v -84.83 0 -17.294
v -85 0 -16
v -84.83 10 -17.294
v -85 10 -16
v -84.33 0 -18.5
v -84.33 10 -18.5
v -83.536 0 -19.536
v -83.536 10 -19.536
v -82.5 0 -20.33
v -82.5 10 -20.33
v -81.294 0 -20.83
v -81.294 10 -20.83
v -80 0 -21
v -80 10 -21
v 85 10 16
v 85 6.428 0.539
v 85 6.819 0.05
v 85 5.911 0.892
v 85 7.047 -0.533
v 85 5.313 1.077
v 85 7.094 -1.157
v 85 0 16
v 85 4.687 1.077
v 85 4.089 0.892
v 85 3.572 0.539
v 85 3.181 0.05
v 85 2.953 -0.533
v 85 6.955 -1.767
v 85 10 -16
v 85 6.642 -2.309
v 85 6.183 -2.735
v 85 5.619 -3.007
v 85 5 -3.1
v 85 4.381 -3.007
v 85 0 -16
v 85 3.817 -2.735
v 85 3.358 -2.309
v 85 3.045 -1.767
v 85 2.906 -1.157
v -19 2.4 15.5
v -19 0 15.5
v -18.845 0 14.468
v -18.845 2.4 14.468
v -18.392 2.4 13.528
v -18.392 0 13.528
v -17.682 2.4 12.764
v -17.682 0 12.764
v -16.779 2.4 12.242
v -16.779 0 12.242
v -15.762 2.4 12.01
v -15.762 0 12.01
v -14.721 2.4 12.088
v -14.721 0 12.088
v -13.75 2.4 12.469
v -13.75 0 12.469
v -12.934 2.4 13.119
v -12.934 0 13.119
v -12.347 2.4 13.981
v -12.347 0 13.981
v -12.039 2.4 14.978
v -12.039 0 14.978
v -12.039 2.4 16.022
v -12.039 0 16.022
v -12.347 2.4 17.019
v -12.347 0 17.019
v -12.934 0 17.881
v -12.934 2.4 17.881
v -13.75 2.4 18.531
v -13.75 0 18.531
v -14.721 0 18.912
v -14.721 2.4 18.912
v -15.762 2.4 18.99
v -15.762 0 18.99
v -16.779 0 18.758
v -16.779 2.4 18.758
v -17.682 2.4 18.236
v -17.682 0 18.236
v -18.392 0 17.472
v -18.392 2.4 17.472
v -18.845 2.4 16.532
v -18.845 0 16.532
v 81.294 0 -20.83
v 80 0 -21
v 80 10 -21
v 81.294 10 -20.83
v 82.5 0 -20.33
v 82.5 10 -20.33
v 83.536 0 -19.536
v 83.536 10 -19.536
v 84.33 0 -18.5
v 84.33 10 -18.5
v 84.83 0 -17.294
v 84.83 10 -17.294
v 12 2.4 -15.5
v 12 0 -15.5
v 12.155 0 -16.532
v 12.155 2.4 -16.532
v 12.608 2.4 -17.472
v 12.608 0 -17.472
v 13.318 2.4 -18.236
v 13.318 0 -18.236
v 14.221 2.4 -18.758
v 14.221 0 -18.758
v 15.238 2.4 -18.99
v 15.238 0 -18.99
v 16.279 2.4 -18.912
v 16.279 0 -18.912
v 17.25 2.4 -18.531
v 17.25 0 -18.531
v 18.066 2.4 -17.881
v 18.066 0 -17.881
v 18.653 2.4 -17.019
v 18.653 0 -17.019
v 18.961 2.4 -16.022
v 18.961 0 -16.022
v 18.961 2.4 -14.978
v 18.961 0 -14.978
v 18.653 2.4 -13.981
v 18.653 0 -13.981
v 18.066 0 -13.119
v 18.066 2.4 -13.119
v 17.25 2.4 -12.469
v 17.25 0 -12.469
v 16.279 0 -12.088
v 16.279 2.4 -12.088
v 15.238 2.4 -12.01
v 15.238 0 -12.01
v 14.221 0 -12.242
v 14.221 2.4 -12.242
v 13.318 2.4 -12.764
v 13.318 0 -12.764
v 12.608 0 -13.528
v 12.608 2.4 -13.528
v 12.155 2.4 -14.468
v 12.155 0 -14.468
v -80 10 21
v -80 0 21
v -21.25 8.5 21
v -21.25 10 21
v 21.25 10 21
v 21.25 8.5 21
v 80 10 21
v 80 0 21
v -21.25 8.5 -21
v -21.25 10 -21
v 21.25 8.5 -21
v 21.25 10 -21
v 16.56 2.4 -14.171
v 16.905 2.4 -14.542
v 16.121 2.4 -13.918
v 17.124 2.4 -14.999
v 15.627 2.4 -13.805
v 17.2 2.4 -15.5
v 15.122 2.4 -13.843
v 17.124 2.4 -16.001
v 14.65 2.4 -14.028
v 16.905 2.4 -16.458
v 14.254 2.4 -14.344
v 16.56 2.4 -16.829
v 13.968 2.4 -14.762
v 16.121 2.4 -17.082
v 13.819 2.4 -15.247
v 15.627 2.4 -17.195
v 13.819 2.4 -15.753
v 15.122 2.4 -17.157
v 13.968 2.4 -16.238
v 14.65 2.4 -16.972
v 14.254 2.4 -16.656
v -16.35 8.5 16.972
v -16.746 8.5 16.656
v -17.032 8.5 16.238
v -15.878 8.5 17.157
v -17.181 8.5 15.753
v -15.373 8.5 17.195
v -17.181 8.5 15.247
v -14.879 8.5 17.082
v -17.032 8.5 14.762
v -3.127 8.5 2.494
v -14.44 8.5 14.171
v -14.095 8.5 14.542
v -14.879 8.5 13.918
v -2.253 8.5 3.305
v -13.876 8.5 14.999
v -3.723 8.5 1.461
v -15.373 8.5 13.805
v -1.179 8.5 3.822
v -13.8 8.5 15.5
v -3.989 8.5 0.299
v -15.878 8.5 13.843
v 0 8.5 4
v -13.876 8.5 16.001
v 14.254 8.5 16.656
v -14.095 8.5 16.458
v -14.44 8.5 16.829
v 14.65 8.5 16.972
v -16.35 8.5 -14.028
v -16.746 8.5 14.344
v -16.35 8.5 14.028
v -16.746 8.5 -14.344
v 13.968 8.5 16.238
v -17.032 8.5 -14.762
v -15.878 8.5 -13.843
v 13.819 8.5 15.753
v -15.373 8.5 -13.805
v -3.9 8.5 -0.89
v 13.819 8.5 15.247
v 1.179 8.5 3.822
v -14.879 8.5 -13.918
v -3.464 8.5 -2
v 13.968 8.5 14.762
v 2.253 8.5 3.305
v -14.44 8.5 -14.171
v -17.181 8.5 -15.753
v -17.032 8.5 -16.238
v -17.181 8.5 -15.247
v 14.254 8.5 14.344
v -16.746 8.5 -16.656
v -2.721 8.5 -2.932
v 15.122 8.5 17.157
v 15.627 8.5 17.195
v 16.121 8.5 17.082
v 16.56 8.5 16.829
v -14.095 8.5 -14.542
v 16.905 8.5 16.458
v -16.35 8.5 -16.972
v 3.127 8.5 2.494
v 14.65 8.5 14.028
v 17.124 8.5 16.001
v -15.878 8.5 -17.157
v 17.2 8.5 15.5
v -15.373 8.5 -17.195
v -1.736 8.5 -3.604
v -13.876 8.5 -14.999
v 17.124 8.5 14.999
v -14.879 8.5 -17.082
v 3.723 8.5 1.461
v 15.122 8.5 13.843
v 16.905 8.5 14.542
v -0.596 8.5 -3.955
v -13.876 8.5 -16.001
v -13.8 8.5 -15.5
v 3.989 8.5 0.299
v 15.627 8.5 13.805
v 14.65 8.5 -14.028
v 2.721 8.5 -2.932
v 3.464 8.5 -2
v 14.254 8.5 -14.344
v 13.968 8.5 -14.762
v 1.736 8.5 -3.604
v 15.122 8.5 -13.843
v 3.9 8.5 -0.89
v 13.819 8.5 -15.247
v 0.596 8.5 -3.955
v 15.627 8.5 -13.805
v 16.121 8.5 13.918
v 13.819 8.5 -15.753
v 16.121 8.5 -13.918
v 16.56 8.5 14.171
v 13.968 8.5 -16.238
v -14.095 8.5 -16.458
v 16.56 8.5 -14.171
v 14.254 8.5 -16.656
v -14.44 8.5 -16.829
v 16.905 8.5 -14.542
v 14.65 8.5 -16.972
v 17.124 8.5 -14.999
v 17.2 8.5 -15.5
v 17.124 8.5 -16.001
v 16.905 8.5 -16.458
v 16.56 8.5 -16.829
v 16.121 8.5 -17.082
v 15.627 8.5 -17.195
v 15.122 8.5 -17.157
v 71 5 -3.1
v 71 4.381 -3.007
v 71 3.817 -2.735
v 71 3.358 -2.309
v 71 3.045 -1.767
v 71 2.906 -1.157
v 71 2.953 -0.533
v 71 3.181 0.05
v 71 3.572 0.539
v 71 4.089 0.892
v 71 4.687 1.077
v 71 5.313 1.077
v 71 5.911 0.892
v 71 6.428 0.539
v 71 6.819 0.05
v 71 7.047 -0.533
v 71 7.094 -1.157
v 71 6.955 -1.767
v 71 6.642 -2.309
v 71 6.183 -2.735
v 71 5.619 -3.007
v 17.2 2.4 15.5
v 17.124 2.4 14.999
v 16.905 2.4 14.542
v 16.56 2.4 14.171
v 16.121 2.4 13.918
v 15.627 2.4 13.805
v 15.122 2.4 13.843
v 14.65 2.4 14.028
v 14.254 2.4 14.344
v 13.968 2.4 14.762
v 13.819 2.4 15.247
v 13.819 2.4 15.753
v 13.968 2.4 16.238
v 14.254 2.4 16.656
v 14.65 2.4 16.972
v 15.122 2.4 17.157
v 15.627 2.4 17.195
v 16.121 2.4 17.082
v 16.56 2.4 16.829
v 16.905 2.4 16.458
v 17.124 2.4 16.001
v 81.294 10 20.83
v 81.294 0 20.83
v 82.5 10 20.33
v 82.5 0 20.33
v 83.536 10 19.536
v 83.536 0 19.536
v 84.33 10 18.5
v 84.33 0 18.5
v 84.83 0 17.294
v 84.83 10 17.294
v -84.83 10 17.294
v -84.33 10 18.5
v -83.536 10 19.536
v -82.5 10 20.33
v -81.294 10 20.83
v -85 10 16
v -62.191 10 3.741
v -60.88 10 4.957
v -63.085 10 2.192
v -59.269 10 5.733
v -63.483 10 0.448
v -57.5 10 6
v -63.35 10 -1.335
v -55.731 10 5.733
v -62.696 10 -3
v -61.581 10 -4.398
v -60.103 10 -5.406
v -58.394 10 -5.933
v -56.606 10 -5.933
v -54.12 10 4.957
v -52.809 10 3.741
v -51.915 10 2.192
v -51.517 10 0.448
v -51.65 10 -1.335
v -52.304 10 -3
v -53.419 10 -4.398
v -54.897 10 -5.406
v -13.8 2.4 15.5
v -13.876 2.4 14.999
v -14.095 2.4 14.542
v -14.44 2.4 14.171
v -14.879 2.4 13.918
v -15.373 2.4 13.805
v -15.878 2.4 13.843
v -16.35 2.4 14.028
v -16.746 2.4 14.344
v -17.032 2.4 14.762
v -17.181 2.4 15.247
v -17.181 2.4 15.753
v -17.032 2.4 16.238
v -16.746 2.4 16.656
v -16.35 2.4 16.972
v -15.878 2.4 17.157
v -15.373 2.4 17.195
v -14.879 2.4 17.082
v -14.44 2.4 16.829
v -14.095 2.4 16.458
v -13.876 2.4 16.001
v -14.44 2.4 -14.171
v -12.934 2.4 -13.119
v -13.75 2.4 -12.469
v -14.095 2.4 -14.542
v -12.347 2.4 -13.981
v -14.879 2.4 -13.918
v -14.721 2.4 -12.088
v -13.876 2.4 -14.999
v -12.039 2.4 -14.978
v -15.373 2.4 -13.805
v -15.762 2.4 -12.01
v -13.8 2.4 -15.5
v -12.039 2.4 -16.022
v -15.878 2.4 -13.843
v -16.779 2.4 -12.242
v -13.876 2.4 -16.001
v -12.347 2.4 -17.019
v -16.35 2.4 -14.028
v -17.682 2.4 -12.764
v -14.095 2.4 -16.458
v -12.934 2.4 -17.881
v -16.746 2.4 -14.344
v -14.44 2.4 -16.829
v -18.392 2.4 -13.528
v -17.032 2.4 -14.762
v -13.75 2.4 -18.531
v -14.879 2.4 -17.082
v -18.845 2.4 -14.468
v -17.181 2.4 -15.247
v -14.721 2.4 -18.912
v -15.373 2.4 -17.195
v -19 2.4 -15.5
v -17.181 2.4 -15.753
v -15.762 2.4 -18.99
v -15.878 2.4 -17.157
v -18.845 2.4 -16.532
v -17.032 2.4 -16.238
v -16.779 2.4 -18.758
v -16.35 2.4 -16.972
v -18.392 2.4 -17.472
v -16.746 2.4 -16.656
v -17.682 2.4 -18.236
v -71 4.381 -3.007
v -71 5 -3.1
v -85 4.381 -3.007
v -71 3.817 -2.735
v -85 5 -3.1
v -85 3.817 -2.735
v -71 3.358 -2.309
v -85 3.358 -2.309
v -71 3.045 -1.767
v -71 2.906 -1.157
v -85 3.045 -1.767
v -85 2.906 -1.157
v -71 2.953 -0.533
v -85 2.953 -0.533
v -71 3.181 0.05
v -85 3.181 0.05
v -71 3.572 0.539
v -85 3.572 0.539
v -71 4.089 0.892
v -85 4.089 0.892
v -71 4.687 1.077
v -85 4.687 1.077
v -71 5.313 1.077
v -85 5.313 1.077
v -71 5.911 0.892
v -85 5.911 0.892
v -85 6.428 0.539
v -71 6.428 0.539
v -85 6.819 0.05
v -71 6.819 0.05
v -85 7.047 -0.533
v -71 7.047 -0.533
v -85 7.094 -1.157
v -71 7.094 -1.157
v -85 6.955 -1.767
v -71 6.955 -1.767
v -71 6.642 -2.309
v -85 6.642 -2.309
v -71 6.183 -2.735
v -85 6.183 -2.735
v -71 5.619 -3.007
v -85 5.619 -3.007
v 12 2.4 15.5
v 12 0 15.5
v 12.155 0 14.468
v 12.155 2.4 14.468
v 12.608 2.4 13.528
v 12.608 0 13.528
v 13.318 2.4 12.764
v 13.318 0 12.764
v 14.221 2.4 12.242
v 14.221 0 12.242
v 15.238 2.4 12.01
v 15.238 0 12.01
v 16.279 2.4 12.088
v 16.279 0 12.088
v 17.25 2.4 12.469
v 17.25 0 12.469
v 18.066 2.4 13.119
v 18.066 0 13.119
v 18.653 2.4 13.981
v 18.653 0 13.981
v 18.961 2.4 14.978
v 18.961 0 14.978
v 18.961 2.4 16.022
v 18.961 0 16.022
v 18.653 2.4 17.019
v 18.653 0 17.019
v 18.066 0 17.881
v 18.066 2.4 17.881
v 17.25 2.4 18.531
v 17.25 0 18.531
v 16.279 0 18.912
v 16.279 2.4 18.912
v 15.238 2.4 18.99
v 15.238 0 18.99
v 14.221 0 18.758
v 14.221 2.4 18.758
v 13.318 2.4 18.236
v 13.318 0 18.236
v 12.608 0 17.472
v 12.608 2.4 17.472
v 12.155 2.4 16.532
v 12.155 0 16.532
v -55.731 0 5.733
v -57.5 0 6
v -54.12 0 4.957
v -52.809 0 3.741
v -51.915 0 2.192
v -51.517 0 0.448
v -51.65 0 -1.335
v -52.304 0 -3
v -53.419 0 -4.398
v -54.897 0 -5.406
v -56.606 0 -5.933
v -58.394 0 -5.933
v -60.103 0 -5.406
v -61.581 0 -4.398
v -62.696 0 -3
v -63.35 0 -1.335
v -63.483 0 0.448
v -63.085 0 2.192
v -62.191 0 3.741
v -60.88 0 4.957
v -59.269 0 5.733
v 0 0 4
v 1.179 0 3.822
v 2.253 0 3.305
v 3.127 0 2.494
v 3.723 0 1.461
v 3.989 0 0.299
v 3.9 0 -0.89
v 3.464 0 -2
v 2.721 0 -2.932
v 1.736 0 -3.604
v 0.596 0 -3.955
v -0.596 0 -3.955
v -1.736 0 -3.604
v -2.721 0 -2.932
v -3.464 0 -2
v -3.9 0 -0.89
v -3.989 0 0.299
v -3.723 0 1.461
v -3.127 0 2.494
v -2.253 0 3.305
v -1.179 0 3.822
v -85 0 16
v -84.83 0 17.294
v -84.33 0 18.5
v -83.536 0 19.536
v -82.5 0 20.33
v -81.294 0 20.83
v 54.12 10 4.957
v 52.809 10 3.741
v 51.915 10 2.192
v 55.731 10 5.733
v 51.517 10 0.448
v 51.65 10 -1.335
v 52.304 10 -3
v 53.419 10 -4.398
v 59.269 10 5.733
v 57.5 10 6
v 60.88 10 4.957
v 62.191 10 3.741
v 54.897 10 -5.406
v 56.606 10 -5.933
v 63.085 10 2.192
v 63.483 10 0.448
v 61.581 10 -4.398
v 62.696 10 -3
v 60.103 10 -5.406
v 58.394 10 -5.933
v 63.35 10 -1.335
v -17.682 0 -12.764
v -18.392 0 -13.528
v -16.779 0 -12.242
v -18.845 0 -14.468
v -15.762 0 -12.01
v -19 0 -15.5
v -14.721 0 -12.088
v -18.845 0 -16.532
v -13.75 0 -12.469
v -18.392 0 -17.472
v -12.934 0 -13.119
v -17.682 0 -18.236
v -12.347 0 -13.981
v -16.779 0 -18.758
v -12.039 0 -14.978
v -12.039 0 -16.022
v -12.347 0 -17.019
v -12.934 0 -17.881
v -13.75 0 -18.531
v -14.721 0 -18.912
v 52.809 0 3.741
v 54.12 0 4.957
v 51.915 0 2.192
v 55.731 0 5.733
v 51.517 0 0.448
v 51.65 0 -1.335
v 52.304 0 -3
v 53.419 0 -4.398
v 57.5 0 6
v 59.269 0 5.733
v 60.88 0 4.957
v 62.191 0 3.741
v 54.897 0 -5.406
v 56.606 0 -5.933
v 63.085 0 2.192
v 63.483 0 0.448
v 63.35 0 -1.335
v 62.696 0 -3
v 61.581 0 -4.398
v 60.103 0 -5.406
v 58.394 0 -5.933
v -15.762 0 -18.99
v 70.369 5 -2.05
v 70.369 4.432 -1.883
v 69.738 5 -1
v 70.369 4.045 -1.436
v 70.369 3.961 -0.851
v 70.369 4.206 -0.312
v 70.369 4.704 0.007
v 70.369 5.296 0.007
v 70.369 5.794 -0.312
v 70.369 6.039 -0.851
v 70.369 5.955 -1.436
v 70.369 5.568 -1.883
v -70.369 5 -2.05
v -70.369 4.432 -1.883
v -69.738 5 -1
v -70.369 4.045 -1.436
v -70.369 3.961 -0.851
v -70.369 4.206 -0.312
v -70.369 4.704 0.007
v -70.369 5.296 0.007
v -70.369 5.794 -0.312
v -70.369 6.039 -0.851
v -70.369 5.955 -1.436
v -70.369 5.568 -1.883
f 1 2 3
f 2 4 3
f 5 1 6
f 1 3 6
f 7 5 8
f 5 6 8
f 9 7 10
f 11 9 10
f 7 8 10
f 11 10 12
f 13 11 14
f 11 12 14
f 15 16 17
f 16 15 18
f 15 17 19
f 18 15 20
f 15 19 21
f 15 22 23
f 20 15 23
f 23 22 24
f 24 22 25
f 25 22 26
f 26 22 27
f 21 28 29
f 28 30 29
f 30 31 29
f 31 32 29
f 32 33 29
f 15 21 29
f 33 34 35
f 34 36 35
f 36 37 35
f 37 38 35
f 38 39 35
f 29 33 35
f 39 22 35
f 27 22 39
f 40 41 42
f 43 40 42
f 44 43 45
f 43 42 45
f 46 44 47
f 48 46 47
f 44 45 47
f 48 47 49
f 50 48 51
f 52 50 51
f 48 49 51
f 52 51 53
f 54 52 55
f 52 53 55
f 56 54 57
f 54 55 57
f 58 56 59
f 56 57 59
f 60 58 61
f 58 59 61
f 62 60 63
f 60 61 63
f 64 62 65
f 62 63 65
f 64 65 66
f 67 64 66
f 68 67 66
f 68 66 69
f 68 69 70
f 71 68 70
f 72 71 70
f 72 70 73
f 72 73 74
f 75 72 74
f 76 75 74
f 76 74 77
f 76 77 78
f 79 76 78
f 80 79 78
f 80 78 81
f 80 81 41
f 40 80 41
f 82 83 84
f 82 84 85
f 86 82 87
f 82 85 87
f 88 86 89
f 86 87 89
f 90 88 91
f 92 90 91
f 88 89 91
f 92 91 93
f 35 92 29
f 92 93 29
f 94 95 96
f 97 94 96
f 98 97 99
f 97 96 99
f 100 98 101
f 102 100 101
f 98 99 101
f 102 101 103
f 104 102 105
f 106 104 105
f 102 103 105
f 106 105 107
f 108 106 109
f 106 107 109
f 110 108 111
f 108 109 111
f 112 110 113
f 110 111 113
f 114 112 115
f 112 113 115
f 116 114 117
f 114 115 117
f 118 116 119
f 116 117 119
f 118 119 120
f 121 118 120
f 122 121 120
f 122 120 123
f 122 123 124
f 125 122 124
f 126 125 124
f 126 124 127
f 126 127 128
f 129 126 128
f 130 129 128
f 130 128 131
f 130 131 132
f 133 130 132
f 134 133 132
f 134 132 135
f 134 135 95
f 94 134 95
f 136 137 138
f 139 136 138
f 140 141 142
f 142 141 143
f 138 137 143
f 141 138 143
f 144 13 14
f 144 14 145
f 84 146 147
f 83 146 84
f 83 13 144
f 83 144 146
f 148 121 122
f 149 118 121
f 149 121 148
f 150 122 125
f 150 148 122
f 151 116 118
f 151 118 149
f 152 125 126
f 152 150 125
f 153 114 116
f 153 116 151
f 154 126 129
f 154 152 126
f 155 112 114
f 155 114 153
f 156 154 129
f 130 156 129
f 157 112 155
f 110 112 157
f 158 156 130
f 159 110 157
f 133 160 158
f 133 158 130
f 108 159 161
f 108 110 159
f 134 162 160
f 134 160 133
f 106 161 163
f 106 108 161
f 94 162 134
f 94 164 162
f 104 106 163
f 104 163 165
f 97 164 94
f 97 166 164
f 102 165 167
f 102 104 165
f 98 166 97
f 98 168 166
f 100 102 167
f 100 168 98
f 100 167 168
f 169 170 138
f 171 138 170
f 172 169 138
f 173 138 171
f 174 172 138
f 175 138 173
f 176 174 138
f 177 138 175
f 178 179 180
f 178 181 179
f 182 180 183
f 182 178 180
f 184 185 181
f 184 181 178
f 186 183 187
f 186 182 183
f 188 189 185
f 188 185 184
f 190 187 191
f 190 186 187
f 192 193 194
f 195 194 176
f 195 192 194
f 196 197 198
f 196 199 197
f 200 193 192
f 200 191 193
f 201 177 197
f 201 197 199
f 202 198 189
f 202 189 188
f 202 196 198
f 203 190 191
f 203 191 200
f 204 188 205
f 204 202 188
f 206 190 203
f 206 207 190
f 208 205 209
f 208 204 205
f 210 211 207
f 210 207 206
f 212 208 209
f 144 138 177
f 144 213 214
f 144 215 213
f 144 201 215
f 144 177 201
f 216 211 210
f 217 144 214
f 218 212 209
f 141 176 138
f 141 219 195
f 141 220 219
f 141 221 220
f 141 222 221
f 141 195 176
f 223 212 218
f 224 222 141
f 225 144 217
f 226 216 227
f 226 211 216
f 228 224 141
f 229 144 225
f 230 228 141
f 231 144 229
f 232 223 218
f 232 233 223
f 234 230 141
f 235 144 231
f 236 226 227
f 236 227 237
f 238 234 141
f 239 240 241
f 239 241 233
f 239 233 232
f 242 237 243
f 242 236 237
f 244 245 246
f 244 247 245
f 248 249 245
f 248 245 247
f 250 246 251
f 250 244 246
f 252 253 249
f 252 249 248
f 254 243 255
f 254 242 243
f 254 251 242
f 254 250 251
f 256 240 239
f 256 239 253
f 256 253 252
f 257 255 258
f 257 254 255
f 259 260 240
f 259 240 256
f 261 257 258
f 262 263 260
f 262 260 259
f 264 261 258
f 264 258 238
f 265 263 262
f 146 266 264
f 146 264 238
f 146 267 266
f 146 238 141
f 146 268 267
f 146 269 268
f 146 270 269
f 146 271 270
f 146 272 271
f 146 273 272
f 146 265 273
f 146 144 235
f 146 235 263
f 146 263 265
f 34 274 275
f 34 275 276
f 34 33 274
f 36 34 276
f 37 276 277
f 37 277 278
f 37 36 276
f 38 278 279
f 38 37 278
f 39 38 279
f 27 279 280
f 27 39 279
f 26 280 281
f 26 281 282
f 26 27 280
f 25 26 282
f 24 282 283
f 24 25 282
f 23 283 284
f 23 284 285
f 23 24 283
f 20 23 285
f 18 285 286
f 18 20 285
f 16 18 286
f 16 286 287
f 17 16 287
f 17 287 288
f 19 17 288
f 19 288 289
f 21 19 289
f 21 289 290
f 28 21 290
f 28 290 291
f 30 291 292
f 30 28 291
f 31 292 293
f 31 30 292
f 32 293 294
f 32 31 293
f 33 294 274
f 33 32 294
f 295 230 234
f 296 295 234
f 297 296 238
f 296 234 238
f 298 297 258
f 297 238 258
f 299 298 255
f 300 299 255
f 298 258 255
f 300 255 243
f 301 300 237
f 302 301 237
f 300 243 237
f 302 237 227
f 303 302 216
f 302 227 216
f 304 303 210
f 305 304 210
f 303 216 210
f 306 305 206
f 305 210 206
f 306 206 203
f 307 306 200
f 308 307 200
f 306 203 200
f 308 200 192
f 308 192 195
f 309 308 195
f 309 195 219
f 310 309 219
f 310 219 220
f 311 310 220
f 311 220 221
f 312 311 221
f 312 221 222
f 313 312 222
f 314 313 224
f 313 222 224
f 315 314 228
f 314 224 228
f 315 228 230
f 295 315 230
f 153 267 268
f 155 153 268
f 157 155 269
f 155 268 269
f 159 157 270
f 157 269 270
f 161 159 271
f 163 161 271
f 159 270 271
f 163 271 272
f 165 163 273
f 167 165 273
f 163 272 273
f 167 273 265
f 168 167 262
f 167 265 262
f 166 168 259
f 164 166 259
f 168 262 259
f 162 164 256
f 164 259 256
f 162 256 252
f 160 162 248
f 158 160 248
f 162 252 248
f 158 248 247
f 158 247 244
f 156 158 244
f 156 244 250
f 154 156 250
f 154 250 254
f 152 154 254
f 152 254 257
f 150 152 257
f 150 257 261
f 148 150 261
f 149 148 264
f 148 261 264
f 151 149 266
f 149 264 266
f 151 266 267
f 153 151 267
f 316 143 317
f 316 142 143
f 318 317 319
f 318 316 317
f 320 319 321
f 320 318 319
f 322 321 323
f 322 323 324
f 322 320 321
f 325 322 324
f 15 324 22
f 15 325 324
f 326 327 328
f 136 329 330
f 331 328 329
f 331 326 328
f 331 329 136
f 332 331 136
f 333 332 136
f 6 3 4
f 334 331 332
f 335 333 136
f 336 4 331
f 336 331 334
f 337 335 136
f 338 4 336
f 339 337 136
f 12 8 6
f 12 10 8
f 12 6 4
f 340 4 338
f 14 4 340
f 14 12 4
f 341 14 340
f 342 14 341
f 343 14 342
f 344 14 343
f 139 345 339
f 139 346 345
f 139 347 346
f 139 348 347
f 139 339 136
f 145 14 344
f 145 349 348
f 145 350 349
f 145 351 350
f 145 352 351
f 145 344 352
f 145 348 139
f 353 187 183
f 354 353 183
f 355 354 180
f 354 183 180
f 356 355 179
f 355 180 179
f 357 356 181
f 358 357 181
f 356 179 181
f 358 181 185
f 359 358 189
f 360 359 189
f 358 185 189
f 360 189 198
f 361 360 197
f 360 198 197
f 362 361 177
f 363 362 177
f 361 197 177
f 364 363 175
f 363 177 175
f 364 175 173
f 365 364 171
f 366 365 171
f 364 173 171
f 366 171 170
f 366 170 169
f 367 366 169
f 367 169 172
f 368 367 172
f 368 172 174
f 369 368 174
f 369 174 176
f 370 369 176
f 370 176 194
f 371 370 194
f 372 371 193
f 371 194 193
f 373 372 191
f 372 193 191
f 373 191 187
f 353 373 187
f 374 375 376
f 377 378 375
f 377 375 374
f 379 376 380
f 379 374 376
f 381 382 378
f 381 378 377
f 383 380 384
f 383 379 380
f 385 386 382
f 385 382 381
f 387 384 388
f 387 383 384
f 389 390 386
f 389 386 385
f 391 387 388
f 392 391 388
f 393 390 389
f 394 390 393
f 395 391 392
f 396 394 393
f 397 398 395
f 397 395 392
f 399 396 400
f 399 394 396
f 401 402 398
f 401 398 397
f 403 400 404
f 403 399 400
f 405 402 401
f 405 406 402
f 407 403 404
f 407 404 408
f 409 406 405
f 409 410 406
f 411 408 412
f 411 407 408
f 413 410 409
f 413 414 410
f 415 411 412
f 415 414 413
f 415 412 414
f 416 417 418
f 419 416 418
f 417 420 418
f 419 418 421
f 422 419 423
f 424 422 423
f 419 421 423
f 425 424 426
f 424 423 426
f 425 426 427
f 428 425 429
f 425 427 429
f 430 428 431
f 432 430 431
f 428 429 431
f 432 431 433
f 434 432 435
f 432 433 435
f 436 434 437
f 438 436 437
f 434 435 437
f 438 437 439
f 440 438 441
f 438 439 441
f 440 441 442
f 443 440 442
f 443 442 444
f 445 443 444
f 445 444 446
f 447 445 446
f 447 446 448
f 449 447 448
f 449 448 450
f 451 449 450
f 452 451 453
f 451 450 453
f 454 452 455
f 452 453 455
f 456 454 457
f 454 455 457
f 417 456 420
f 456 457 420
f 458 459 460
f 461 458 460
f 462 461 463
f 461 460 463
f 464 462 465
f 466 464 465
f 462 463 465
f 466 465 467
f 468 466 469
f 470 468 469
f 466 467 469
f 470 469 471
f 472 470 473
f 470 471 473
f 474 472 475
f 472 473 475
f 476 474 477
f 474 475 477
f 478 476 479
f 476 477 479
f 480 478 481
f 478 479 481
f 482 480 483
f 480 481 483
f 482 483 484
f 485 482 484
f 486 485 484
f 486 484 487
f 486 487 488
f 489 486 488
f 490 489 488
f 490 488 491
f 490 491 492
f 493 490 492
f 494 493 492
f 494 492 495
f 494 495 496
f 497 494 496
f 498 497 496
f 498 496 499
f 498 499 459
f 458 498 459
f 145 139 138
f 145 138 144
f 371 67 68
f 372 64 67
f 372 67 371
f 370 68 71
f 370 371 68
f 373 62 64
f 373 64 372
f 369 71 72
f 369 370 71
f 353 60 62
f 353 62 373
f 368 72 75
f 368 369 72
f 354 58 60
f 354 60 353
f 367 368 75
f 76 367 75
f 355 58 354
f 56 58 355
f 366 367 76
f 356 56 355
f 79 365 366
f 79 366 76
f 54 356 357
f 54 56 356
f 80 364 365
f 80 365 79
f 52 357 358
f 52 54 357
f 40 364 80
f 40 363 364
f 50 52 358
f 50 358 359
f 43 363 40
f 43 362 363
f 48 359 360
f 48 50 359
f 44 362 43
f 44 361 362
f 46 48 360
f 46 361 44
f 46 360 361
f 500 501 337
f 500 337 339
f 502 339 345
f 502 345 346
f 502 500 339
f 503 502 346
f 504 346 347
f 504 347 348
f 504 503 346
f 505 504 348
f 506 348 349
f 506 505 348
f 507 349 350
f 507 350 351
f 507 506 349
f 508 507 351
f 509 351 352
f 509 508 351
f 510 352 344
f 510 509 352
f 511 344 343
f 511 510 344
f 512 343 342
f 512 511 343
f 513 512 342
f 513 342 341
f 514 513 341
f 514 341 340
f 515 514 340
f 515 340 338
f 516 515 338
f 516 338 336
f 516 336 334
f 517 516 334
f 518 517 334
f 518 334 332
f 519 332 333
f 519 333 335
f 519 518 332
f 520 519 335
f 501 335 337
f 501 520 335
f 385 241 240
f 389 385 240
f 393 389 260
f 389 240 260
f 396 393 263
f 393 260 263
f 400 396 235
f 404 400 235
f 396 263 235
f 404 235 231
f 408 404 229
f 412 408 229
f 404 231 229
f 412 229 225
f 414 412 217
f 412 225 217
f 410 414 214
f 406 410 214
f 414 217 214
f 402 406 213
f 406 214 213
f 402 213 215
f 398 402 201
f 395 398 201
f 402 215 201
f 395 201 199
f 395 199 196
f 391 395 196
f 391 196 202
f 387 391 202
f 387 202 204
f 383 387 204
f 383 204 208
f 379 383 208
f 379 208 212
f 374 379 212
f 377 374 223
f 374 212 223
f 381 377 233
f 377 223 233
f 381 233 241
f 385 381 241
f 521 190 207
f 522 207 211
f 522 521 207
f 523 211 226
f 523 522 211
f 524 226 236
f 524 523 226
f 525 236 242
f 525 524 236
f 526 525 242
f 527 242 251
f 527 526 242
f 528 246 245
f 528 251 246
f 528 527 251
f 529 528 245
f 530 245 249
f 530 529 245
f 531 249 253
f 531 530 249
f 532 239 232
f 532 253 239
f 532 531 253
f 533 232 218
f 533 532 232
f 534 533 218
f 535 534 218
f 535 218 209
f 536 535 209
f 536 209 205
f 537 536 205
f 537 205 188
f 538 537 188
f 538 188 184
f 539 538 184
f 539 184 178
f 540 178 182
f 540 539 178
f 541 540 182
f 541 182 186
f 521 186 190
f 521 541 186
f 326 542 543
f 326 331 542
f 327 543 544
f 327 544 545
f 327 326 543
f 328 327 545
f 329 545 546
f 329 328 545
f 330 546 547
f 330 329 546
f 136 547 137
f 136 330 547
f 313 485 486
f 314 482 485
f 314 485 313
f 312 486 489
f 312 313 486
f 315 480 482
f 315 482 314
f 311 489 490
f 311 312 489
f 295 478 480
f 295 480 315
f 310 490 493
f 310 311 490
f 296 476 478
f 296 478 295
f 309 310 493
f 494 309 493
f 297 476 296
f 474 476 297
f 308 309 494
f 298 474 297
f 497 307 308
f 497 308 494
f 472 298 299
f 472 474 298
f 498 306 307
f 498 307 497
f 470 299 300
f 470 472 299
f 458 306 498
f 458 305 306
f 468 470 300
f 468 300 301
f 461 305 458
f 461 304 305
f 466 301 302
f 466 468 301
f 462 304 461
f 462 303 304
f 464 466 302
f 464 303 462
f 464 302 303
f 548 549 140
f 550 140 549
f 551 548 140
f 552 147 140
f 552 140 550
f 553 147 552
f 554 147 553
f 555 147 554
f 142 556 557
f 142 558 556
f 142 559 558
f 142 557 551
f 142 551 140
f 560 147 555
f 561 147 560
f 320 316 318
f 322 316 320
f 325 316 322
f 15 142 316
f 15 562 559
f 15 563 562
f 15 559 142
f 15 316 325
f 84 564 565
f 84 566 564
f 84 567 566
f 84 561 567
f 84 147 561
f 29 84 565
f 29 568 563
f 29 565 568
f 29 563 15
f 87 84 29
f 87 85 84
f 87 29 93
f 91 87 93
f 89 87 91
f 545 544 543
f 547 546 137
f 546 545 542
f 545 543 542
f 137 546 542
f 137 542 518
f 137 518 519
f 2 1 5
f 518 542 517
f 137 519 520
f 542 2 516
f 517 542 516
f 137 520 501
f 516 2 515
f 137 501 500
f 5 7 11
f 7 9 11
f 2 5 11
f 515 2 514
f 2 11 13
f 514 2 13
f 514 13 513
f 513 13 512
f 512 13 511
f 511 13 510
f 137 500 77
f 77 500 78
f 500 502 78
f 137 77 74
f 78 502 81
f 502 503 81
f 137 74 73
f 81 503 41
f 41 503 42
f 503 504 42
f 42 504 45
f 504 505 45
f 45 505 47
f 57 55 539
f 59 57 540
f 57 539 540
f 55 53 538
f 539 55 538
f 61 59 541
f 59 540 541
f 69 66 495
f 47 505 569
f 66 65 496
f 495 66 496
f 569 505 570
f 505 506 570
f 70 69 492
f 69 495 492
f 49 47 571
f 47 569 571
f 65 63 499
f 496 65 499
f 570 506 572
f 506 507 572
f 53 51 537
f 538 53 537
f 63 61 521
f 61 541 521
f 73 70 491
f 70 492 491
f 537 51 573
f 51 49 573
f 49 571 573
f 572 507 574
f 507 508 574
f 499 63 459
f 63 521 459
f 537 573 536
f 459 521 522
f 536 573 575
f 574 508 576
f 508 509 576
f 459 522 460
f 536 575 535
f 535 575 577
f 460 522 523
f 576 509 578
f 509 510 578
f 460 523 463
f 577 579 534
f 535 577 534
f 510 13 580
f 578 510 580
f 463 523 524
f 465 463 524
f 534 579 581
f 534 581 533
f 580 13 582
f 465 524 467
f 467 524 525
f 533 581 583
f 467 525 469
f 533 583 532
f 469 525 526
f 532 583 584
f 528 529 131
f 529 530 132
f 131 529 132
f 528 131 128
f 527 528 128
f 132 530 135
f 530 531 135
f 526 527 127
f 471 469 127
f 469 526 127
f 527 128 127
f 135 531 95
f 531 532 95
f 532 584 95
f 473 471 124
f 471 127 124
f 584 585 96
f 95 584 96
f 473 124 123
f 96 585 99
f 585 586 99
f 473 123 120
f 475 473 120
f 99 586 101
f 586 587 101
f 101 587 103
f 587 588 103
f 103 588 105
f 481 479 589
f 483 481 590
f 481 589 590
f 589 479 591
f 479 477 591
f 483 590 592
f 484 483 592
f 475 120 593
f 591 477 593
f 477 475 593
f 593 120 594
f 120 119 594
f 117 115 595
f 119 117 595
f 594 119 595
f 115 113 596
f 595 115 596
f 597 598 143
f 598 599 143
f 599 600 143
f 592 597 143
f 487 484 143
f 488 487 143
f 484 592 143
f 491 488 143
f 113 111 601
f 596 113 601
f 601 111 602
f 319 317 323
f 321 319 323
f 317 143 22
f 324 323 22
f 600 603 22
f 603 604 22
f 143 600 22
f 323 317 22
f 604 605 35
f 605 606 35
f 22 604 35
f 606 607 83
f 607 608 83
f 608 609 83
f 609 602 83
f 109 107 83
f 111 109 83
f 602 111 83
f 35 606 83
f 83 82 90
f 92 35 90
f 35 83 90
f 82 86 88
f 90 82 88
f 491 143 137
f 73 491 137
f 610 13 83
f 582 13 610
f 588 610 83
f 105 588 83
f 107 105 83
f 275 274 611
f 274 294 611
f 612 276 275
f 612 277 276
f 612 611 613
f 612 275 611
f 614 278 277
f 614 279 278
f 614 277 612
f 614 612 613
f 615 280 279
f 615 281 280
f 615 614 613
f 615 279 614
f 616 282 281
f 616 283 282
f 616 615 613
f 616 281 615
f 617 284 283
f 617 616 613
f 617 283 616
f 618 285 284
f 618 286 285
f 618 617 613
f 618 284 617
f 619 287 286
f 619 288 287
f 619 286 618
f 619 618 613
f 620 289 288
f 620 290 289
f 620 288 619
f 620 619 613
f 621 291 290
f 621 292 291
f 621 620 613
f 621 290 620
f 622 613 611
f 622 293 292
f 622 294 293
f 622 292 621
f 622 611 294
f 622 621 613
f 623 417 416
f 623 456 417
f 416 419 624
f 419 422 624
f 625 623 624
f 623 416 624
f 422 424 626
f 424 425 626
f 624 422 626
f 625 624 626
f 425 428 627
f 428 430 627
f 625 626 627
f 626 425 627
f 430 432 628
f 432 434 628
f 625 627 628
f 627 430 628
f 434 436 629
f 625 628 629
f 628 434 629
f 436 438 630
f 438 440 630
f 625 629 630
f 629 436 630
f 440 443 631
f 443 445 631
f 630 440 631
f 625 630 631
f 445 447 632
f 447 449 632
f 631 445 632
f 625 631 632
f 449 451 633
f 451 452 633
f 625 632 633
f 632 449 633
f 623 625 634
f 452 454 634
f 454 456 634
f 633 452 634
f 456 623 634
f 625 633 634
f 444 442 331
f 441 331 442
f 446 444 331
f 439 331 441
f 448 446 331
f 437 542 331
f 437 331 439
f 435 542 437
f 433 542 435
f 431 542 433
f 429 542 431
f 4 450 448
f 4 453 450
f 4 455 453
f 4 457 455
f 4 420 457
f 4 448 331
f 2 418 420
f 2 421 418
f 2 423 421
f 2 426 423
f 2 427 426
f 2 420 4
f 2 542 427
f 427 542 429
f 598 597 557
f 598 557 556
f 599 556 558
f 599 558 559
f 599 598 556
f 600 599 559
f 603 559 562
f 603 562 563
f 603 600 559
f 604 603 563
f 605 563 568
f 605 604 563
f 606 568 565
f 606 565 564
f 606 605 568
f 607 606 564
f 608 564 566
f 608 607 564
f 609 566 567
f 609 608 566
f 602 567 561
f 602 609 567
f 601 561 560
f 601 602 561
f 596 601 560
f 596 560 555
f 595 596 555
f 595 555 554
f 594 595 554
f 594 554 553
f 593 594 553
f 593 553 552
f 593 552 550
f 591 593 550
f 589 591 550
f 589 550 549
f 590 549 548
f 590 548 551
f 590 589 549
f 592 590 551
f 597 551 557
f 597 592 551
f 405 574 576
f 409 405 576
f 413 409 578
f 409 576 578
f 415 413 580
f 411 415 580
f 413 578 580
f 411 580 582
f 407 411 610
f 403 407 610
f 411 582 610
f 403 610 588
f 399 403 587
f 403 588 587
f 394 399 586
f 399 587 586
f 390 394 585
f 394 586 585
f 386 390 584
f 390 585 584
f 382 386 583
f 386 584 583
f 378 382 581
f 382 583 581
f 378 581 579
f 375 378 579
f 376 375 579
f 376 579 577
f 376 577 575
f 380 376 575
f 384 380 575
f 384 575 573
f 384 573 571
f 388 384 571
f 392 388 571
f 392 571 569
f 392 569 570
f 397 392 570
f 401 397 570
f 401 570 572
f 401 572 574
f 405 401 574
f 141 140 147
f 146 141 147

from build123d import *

# Parameters (mm, degrees)
ESBO_O1_W                                           = 170
ESBO_O1_H                                           = 42
ESBO_O1_R                                           = 6
ESBO_O1_R_2                                         = 4
RESSALTO_EXTRUS_O1_DEPTH                            = 10
REBAIXO_PARA_PARAFUSO_COM_CABE_A_PANELA_D           = 3.4
REBAIXO_PARA_PARAFUSO_COM_CABE_A_PANELA_CBORE_D     = 7
REBAIXO_PARA_PARAFUSO_COM_CABE_A_PANELA_CBORE_DEPTH = 2.4
ESBO_O7_W                                           = 42.5
ESBO_O7_H                                           = 46.397828282
CORTE_EXTRUS_O2_DEPTH                               = 1.5
FILETE1_R                                           = 5


with BuildPart() as part:
    # Esboço1 → Ressalto-extrusão1 (new body)
    with BuildSketch(Plane(origin=(0, 0, 0), x_dir=(1, 0, 0), z_dir=(0, 1, 0))):
        Rectangle(ESBO_O1_W, ESBO_O1_H)
        with Locations(Location((-57.5, 0, 0), (0, 0, 270))):
            Circle(ESBO_O1_R, mode=Mode.SUBTRACT)
        with Locations(Location((57.5, 0, 0), (0, 0, 270))):
            Circle(ESBO_O1_R, mode=Mode.SUBTRACT)
        with Locations(Location((0, 0, 0), (0, 0, 270))):
            Circle(ESBO_O1_R_2, mode=Mode.SUBTRACT)
    extrude(amount=RESSALTO_EXTRUS_O1_DEPTH)

    # Esboço2 → Furo roscado de M51 (revolve, cut)
    with BuildSketch(Plane(origin=(85, 5, -1), x_dir=(0, 0, -1), z_dir=(0, 1, 0))):
        Polygon((0, 0), (0, 15.2618073), (2.1, 14), (2.1, 0), align=None)
    furo_roscado_de_m51 = revolve(axis=Axis((91.35, 5, -1), (-1, 0, 0)), mode=Mode.SUBTRACT)

    # Espelhar1: Furo roscado de M51 across plane
    add(furo_roscado_de_m51.mirror(Plane(origin=(0, 0, 0), x_dir=(0, 0, 1), z_dir=(1, 0, 0))), mode=Mode.SUBTRACT)

    # Rebaixo para parafuso com cabeça panela de M31 (through all)
    with Locations(Plane(origin=(0, 0, 0), x_dir=(-1, 0, 0), z_dir=(0, -1, 0))):
        with Locations((-15.5, 15.5), (15.5, 15.5), (-15.5, -15.5), (15.5, -15.5)):
            CounterBoreHole(REBAIXO_PARA_PARAFUSO_COM_CABE_A_PANELA_D / 2, REBAIXO_PARA_PARAFUSO_COM_CABE_A_PANELA_CBORE_D / 2, REBAIXO_PARA_PARAFUSO_COM_CABE_A_PANELA_CBORE_DEPTH)

    # Esboço7 → Corte-extrusão2 (cut)
    with BuildSketch(Plane(origin=(0, 10, 0), x_dir=(1, 0, 0), z_dir=(0, 1, 0))):
        with Locations((0, -0.001085859)):
            Rectangle(ESBO_O7_W, ESBO_O7_H)
    extrude(amount=-CORTE_EXTRUS_O2_DEPTH, mode=Mode.SUBTRACT)

    # Filete1
    filete1_edges = [part.edges().sort_by_distance(p)[0] for p in [
        (85, 5, 21),
        (-85, 5, 21),
        (-85, 5, -21),
        (85, 5, -21),
    ]]
    fillet(filete1_edges, radius=FILETE1_R)


solid = part.part
